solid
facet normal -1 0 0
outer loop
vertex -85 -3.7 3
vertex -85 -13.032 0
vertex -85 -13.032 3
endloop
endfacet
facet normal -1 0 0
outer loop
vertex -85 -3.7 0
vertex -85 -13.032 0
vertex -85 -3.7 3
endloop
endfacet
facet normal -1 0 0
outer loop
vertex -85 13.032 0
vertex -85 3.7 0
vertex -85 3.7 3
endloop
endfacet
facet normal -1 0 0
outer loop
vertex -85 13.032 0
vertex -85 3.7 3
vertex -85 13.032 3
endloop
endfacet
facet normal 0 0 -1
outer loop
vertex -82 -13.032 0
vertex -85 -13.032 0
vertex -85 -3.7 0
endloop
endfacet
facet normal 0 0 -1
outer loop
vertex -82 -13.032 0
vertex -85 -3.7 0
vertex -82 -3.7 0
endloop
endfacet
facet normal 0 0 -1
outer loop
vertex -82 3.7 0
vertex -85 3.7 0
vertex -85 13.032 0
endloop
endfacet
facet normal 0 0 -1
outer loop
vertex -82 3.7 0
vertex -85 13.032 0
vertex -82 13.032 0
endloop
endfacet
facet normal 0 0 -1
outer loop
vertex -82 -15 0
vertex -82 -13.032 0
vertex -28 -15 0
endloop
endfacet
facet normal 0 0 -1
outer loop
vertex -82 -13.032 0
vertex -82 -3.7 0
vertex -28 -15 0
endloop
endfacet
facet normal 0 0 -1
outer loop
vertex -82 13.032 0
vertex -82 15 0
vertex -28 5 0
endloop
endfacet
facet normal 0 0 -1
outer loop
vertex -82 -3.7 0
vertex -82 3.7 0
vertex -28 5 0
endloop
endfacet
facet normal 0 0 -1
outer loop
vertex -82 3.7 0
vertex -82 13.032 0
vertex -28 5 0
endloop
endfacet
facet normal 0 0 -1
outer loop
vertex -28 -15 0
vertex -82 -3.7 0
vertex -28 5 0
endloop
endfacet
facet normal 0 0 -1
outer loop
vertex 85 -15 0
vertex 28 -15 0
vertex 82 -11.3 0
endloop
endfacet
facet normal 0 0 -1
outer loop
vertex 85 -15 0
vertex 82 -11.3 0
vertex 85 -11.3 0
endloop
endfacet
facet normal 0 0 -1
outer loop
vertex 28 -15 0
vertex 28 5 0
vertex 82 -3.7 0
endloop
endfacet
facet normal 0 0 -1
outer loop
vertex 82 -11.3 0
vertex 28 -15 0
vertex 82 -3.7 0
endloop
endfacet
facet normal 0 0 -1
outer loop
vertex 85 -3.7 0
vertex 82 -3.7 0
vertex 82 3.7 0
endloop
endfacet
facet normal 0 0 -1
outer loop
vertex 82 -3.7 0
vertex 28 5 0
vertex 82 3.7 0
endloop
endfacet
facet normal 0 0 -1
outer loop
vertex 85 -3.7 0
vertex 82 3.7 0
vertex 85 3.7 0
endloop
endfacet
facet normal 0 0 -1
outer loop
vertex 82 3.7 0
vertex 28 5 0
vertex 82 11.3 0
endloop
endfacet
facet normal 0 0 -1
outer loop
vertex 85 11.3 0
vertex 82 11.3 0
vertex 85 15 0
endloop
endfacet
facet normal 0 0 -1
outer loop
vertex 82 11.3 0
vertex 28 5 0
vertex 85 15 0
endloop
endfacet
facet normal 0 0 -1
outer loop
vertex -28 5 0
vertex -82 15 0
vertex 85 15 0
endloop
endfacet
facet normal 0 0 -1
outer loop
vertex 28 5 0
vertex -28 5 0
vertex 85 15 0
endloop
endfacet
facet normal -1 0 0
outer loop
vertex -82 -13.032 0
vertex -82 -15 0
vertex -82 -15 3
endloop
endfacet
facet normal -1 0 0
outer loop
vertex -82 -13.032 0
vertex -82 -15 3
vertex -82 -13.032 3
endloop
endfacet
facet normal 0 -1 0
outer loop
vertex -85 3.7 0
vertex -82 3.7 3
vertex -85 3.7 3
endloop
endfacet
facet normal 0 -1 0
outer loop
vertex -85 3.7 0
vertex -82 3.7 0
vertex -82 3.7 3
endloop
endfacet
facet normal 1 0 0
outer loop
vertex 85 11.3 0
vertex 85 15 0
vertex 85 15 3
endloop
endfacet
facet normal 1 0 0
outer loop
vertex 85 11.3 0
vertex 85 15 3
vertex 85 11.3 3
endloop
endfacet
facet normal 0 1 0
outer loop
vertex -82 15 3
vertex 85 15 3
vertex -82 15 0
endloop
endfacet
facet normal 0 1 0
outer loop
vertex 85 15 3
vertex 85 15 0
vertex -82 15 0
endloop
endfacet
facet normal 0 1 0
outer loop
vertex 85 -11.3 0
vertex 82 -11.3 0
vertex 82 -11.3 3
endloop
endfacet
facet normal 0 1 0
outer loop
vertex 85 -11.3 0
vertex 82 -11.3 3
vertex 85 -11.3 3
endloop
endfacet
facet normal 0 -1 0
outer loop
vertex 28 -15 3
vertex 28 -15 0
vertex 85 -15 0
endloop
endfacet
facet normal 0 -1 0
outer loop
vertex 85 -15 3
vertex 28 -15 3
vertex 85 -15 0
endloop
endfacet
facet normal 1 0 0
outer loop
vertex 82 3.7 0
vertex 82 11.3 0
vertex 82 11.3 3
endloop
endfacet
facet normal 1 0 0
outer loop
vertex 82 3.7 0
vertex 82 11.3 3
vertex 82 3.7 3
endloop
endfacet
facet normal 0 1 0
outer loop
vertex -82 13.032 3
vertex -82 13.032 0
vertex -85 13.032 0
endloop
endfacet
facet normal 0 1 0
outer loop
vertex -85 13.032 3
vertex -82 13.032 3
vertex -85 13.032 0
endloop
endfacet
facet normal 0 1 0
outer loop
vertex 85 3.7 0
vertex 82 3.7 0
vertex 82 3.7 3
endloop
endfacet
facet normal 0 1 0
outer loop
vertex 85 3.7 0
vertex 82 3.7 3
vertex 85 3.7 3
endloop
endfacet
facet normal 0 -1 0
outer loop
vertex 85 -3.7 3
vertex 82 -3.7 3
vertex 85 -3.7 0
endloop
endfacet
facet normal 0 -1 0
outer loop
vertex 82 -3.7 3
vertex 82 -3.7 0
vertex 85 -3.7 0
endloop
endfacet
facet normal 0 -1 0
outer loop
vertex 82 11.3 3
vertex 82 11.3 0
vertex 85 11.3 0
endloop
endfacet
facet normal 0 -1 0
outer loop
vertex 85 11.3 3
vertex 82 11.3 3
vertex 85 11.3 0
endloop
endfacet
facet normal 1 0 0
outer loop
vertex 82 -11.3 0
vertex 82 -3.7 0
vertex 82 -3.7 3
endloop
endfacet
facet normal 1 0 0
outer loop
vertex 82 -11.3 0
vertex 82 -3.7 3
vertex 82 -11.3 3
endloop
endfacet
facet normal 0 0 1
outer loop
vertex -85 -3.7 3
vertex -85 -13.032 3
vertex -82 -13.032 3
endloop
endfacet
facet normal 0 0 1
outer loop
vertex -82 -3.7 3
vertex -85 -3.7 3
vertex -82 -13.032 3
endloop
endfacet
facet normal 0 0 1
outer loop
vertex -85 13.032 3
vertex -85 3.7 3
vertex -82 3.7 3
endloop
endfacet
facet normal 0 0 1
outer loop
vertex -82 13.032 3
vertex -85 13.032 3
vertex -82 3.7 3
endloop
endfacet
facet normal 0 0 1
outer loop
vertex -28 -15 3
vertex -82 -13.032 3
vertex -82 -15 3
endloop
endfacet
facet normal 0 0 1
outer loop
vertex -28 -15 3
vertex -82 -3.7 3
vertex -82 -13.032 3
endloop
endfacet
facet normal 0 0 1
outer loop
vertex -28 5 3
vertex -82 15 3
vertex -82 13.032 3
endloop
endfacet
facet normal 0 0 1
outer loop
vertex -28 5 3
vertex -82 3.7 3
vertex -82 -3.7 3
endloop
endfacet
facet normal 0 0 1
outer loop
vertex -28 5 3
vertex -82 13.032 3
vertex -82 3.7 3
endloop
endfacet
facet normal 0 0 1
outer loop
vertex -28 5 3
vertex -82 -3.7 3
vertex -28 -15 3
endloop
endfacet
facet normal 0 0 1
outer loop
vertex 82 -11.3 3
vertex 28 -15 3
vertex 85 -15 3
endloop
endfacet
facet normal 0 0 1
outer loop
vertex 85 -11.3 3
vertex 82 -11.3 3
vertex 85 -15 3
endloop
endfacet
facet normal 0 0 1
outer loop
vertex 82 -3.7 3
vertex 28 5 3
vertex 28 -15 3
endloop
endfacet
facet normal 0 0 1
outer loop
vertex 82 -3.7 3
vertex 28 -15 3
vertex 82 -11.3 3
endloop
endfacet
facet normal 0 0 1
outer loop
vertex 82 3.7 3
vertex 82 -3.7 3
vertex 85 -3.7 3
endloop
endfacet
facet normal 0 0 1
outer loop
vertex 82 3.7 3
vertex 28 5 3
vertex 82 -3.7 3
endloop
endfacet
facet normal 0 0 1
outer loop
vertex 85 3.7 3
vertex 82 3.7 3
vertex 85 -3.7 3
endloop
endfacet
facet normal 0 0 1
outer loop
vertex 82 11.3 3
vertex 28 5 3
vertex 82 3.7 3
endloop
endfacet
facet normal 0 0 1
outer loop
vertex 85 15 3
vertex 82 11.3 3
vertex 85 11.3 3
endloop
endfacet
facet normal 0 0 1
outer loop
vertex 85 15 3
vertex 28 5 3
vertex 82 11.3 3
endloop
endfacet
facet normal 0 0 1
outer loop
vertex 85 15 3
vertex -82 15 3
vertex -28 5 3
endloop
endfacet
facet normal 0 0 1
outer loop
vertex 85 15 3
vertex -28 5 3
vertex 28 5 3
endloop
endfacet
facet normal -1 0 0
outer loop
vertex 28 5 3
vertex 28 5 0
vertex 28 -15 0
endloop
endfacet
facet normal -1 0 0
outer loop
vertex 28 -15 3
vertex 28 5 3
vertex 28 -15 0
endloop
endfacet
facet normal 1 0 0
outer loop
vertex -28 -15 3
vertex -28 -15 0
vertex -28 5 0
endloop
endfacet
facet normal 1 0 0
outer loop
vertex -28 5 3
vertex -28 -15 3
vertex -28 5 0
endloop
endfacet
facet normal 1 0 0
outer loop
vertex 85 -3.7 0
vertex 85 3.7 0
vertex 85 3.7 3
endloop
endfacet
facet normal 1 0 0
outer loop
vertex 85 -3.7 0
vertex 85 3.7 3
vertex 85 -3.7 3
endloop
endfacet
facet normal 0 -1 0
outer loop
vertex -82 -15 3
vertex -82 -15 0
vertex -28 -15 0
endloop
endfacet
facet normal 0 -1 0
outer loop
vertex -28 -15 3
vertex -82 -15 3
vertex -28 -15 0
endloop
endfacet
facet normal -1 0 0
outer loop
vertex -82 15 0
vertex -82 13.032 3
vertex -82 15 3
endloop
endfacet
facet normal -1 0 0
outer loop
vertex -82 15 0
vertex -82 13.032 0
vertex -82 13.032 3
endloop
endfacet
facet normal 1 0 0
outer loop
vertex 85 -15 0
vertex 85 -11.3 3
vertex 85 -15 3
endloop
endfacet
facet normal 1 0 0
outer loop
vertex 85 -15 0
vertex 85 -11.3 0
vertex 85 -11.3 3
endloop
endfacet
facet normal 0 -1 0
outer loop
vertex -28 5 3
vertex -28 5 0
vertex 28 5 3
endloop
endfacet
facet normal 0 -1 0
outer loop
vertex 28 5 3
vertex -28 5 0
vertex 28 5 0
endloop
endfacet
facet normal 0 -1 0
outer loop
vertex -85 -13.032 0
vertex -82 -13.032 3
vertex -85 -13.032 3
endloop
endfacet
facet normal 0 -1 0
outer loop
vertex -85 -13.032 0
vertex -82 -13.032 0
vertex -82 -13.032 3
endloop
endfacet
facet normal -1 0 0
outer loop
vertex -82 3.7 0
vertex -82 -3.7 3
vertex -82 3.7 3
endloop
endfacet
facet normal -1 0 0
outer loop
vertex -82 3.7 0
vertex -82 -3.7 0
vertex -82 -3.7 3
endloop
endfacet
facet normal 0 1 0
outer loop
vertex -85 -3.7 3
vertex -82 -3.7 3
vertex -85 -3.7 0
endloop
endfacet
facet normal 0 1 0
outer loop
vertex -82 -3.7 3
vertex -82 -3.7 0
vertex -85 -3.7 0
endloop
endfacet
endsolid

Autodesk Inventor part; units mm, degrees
ref_plane "YZ Plane" through (0, 0, 0) normal (1, 0, 0) x (0, 1, 0)
ref_plane "XZ Plane" through (0, 0, 0) normal (0, 1, 0) x (-1, 0, 0)
ref_plane "XY Plane" through (0, 0, 0) normal (0, 0, 1) x (1, 0, 0)
sketch "Boceto1" plane through (0, 0, 0) normal (0, 0, 1) x (1, 0, 0)
  line L0 (85, 15) -> (-82, 15)
  line L1 (-85, -15) -> (85, 15) construction
  line L2 (85, -15) -> (-85, 15) construction
  line L3 (-28, -15) -> (-28, 5)
  line L4 (28, 5) -> (28, -15)
  line L5 (-28, 5) -> (28, 5)
  line L6 (-82, -15) -> (-28, -15)
  line L7 (28, -15) -> (85, -15)
  line L8 (-82, -13.0321) -> (-82, -3.7)
  line L9 (-82, -3.7) -> (-85, -3.7) projected
  line L10 (-85, -13.0321) -> (-85, -3.7) projected
  line L11 (-82, -13.0321) -> (-85, -13.0321) projected
  line L12 (-82, 3.7) -> (-82, 13.0321)
  line L13 (-82, 13.0321) -> (-85, 13.0321) projected
  line L14 (-85, 3.7) -> (-85, 13.0321) projected
  line L15 (-82, 3.7) -> (-85, 3.7) projected
  line L16 (-82, -3.7) -> (-82, 3.7) projected
  line L17 (-82, 13.0321) -> (-82, 15) projected
  line L18 (-82, -15) -> (-82, -13.0321) projected
  line L19 (82, 15) -> (82, 11.3) projected
  line L20 (82, 11.3) -> (85, 11.3) projected
  line L21 (85, 15) -> (85, 11.3) projected
  line L22 (82, 15) -> (85, 15) projected
  line L23 (82, 3.7) -> (82, -3.7) projected
  line L24 (82, -3.7) -> (85, -3.7) projected
  line L25 (85, 3.7) -> (85, -3.7) projected
  line L26 (82, 3.7) -> (85, 3.7) projected
  line L27 (82, -11.3) -> (82, -15) projected
  line L28 (82, -15) -> (85, -15) projected
  line L29 (85, -11.3) -> (85, -15) projected
  line L30 (82, -11.3) -> (85, -11.3) projected
  line L31 (82, -3.7) -> (82, -11.3) projected
  line L32 (82, 11.3) -> (82, 3.7) projected
  point P0 (0, 0)
  point P1 (28, 0)
  dimension "d0" = 30
  dimension "d1" = 170
  dimension "d7" = 20
  dimension "d11" = 30
extrude "Extrusión1" add sketch "Boceto1" along normal blind 3
